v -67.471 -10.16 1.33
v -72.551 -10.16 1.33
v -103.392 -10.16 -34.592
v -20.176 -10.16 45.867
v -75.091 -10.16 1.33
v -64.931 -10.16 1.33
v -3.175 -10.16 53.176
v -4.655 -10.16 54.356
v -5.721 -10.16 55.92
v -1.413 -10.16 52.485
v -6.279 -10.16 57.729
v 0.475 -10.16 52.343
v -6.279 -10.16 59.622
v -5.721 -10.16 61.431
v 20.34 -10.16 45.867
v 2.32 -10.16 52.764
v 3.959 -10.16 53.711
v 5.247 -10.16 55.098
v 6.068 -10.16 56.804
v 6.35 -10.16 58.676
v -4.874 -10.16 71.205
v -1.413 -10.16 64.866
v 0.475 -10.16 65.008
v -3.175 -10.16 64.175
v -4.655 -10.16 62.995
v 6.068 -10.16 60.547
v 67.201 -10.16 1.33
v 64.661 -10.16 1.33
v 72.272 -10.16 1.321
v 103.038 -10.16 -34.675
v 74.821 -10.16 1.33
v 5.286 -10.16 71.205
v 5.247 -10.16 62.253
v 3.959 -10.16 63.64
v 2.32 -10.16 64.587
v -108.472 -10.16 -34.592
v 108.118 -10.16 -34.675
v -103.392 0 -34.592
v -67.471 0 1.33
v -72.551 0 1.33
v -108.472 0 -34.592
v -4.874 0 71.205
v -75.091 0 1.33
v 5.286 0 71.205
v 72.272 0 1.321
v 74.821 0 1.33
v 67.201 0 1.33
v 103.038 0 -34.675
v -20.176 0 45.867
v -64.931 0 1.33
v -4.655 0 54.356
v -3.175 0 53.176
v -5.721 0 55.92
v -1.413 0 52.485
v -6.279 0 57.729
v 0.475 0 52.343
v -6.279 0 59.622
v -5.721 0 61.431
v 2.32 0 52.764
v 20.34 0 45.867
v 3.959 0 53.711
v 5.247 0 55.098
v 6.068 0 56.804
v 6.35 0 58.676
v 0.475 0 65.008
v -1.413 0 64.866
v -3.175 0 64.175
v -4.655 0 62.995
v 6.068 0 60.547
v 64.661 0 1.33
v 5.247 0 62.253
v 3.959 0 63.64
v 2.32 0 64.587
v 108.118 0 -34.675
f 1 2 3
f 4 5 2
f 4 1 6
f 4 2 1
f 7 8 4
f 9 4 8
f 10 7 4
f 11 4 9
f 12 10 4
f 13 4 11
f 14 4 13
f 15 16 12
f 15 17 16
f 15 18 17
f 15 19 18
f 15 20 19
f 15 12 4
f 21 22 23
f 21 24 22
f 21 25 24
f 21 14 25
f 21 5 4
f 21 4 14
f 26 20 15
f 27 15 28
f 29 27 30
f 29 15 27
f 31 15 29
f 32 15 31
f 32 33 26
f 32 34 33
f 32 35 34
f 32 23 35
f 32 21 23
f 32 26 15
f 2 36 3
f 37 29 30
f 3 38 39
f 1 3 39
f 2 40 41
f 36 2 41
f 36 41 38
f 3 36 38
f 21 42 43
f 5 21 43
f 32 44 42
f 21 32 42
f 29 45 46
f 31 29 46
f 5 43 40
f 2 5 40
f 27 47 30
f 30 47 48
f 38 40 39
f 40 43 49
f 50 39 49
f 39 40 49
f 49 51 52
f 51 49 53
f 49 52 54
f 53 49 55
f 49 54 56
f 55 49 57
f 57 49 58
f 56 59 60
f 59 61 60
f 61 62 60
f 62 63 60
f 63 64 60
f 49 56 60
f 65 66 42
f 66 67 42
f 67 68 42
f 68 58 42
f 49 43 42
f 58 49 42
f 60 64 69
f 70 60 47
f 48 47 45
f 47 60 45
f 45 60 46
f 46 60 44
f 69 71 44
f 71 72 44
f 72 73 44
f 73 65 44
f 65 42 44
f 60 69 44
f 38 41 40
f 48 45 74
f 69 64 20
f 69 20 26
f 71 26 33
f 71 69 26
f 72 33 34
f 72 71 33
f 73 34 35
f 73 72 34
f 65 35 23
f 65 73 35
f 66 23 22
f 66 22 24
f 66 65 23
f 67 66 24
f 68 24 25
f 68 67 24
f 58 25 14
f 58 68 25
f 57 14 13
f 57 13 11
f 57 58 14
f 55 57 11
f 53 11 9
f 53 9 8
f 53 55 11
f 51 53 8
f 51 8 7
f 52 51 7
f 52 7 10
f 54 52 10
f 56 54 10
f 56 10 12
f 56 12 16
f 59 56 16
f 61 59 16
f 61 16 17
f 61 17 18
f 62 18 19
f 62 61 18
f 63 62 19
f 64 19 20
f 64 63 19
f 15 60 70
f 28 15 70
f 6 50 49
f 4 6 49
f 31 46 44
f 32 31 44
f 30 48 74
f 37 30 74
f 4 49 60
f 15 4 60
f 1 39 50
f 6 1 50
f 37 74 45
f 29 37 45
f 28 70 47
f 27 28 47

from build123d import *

# Parameters (mm, degrees)
F0_R     = 6.35
F1_DEPTH = 10.16


# Not quite as in the source:
# - a feature names something its author has since deleted; it is built from what else it names


with BuildPart() as f1:
    # F0 (on Front) → F1 (new body)
    with BuildSketch(Plane.XZ):
        Polygon((-4.8744329511, 71.2045607365), (-75.0909721843, 1.3295207142), (-72.5509721843, 1.3295207142), (-108.4719966685, -34.5915037701), (-103.3919966685, -34.5915037701), (-67.4709721843, 1.3295207142), (-64.9309721843, 1.3295207142), (-20.1762745117, 45.8665532311), (-4.9362745117, 45.8665532311), (5.2855670489, 45.8665532311), (20.3403427678, 45.8665532311), (64.660768747, 1.3295207142), (67.200768747, 1.3295207142), (103.0377074058, -34.6753932222), (108.1177074058, -34.6753932222), (72.2719103919, 1.3207015165), (74.820768747, 1.3295207142), (5.2855670489, 71.2045607365), align=None)
        with Locations((0, 58.6755184585)):
            Circle(F0_R, mode=Mode.SUBTRACT)
    extrude(amount=F1_DEPTH)


solid = f1.part
